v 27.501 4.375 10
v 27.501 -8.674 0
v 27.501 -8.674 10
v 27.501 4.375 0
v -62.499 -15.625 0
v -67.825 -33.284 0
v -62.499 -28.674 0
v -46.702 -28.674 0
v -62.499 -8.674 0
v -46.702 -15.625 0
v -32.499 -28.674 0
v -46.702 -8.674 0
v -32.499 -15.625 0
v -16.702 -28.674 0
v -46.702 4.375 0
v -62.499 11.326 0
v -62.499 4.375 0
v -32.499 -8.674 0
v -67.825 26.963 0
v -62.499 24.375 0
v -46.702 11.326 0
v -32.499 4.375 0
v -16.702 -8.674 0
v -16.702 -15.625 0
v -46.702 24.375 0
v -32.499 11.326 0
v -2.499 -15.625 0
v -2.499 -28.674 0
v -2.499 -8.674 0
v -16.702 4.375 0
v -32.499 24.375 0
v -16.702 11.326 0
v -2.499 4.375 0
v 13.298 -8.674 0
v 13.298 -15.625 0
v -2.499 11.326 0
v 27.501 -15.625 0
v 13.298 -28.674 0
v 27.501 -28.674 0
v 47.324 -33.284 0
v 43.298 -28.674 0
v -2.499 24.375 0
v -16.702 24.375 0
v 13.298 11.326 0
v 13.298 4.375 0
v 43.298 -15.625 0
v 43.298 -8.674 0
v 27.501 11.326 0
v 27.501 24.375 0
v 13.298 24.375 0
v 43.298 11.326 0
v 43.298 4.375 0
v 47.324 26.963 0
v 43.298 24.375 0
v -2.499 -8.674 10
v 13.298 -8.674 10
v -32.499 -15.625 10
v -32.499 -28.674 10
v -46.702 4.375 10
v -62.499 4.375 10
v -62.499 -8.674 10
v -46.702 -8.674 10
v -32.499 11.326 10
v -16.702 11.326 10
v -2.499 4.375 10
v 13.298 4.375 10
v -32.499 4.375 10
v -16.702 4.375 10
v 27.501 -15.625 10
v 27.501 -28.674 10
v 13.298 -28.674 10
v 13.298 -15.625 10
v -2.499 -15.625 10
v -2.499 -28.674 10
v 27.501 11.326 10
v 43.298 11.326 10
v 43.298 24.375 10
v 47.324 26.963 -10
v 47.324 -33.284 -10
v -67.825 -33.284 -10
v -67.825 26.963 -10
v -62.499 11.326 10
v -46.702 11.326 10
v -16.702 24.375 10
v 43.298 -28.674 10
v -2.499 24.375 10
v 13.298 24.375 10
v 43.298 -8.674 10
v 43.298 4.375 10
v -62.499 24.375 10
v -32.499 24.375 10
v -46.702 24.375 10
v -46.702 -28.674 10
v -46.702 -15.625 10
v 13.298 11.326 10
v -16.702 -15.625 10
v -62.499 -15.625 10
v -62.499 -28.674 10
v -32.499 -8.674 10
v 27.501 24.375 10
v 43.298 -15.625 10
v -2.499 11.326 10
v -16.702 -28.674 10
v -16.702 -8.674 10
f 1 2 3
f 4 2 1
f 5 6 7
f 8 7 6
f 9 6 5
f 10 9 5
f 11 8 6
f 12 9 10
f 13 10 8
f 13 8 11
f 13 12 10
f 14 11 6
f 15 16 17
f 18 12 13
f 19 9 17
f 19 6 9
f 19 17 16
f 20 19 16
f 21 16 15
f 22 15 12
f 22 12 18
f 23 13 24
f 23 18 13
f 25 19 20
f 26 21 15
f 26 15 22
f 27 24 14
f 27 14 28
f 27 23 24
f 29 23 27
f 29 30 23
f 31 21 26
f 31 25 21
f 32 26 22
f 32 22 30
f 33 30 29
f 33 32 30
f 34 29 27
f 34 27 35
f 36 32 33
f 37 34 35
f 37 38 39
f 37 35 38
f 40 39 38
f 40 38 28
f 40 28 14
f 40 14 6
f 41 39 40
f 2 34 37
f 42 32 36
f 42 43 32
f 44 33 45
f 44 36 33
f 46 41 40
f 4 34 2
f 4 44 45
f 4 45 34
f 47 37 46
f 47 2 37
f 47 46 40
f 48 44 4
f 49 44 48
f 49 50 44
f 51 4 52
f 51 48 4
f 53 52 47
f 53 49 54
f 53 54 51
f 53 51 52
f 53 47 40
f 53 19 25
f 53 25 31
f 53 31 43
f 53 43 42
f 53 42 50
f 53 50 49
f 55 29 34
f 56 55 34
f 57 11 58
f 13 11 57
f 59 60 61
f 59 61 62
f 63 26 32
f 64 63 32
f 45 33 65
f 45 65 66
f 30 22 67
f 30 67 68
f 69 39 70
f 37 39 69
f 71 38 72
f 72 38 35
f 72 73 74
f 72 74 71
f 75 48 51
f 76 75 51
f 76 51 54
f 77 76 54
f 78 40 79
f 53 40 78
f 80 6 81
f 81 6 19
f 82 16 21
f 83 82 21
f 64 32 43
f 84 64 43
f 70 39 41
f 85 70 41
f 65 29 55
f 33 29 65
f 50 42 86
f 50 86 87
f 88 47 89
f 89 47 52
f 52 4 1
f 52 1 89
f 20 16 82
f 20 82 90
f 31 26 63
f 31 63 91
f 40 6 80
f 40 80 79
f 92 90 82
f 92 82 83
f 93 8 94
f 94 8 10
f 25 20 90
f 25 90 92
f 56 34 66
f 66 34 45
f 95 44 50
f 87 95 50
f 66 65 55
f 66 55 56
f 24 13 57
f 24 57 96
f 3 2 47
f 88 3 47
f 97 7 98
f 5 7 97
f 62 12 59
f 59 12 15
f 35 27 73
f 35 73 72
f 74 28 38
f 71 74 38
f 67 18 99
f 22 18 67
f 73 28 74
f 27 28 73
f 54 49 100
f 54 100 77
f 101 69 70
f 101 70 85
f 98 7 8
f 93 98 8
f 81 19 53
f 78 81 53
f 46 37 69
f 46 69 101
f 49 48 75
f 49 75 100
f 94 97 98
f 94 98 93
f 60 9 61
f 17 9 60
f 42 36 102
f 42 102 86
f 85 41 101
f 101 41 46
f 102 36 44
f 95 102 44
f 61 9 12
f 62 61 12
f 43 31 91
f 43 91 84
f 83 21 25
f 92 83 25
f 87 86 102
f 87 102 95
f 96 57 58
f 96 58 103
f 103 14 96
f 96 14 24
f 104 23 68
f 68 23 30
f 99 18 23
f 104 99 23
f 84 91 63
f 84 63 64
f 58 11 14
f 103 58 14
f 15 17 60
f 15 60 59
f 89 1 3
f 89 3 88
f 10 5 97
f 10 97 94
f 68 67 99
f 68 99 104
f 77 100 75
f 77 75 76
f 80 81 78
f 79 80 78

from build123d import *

# Parameters (mm, degrees)
SKETCH1_W              = 15.796409329
SKETCH1_H              = 13.049207706
BOSS_EXTRUDE2_DEPTH    = 10
BOSS_EXTRUDE2_2_DEPTH  = 10
BOSS_EXTRUDE2_3_DEPTH  = 10
BOSS_EXTRUDE2_4_DEPTH  = 10
BOSS_EXTRUDE2_5_DEPTH  = 10
BOSS_EXTRUDE2_6_DEPTH  = 10
BOSS_EXTRUDE2_7_DEPTH  = 10
BOSS_EXTRUDE2_8_DEPTH  = 10
BOSS_EXTRUDE2_9_DEPTH  = 10
BOSS_EXTRUDE2_10_DEPTH = 10
BOSS_EXTRUDE2_11_DEPTH = 10
BOSS_EXTRUDE2_12_DEPTH = 10
SKETCH2_W              = 115.149189571
SKETCH2_H              = 60.247442975
BOSS_EXTRUDE3_DEPTH    = 10


with BuildPart() as part:
    # Sketch1 → Boss-Extrude2 (new body)
    with BuildSketch(Plane.XY):
        with Locations((-24.600632245, -22.14931308)):
            Rectangle(SKETCH1_W, SKETCH1_H)
    extrude(amount=BOSS_EXTRUDE2_DEPTH)



with BuildPart() as body_2:
    # Sketch1 → Boss-Extrude2 2 (new body)
    with BuildSketch(Plane.XY):
        with Locations((-54.600632245, -22.14931308)):
            Rectangle(SKETCH1_W, SKETCH1_H)
    extrude(amount=BOSS_EXTRUDE2_2_DEPTH)


with BuildPart() as body_3:
    # Sketch1 → Boss-Extrude2 3 (new body)
    with BuildSketch(Plane.XY):
        with Locations((5.399367756, -22.14931308)):
            Rectangle(SKETCH1_W, SKETCH1_H)
    extrude(amount=BOSS_EXTRUDE2_3_DEPTH)


with BuildPart() as body_4:
    # Sketch1 → Boss-Extrude2 4 (new body)
    with BuildSketch(Plane.XY):
        with Locations((35.399367756, -22.14931308)):
            Rectangle(SKETCH1_W, SKETCH1_H)
    extrude(amount=BOSS_EXTRUDE2_4_DEPTH)


with BuildPart() as body_5:
    # Sketch1 → Boss-Extrude2 5 (new body)
    with BuildSketch(Plane.XY):
        with Locations((-24.600632245, -2.14931308)):
            Rectangle(SKETCH1_W, SKETCH1_H)
    extrude(amount=BOSS_EXTRUDE2_5_DEPTH)


with BuildPart() as body_6:
    # Sketch1 → Boss-Extrude2 6 (new body)
    with BuildSketch(Plane.XY):
        with Locations((5.399367756, -2.14931308)):
            Rectangle(SKETCH1_W, SKETCH1_H)
    extrude(amount=BOSS_EXTRUDE2_6_DEPTH)


with BuildPart() as body_7:
    # Sketch1 → Boss-Extrude2 7 (new body)
    with BuildSketch(Plane.XY):
        with Locations((35.399367756, -2.14931308)):
            Rectangle(SKETCH1_W, SKETCH1_H)
    extrude(amount=BOSS_EXTRUDE2_7_DEPTH)


with BuildPart() as body_8:
    # Sketch1 → Boss-Extrude2 8 (new body)
    with BuildSketch(Plane.XY):
        with Locations((-24.600632245, 17.85068692)):
            Rectangle(SKETCH1_W, SKETCH1_H)
    extrude(amount=BOSS_EXTRUDE2_8_DEPTH)


with BuildPart() as body_9:
    # Sketch1 → Boss-Extrude2 9 (new body)
    with BuildSketch(Plane.XY):
        with Locations((5.399367756, 17.85068692)):
            Rectangle(SKETCH1_W, SKETCH1_H)
    extrude(amount=BOSS_EXTRUDE2_9_DEPTH)


with BuildPart() as body_10:
    # Sketch1 → Boss-Extrude2 10 (new body)
    with BuildSketch(Plane.XY):
        with Locations((35.399367756, 17.85068692)):
            Rectangle(SKETCH1_W, SKETCH1_H)
    extrude(amount=BOSS_EXTRUDE2_10_DEPTH)


with BuildPart() as body_11:
    # Sketch1 → Boss-Extrude2 11 (new body)
    with BuildSketch(Plane.XY):
        with Locations((-54.600632245, -2.14931308)):
            Rectangle(SKETCH1_W, SKETCH1_H)
    extrude(amount=BOSS_EXTRUDE2_11_DEPTH)


with BuildPart() as body_12:
    # Sketch1 → Boss-Extrude2 12 (new body)
    with BuildSketch(Plane.XY):
        with Locations((-54.600632245, 17.85068692)):
            Rectangle(SKETCH1_W, SKETCH1_H)
    extrude(amount=BOSS_EXTRUDE2_12_DEPTH)


with BuildPart() as part_1:
    add(part.part)

    add(body_2.part)  # Boss-Extrude3 merges body 2

    add(body_3.part)  # Boss-Extrude3 merges body 3

    add(body_4.part)  # Boss-Extrude3 merges body 4

    add(body_5.part)  # Boss-Extrude3 merges body 5

    add(body_6.part)  # Boss-Extrude3 merges body 6

    add(body_7.part)  # Boss-Extrude3 merges body 7

    add(body_8.part)  # Boss-Extrude3 merges body 8

    add(body_9.part)  # Boss-Extrude3 merges body 9

    add(body_10.part)  # Boss-Extrude3 merges body 10

    add(body_11.part)  # Boss-Extrude3 merges body 11

    add(body_12.part)  # Boss-Extrude3 merges body 12
    # Sketch2 → Boss-Extrude3 (add)
    with BuildSketch(Plane.XY):
        with Locations((-10.250784507, -3.160661043)):
            Rectangle(SKETCH2_W, SKETCH2_H)
    extrude(amount=-BOSS_EXTRUDE3_DEPTH)


solid = part_1.part
